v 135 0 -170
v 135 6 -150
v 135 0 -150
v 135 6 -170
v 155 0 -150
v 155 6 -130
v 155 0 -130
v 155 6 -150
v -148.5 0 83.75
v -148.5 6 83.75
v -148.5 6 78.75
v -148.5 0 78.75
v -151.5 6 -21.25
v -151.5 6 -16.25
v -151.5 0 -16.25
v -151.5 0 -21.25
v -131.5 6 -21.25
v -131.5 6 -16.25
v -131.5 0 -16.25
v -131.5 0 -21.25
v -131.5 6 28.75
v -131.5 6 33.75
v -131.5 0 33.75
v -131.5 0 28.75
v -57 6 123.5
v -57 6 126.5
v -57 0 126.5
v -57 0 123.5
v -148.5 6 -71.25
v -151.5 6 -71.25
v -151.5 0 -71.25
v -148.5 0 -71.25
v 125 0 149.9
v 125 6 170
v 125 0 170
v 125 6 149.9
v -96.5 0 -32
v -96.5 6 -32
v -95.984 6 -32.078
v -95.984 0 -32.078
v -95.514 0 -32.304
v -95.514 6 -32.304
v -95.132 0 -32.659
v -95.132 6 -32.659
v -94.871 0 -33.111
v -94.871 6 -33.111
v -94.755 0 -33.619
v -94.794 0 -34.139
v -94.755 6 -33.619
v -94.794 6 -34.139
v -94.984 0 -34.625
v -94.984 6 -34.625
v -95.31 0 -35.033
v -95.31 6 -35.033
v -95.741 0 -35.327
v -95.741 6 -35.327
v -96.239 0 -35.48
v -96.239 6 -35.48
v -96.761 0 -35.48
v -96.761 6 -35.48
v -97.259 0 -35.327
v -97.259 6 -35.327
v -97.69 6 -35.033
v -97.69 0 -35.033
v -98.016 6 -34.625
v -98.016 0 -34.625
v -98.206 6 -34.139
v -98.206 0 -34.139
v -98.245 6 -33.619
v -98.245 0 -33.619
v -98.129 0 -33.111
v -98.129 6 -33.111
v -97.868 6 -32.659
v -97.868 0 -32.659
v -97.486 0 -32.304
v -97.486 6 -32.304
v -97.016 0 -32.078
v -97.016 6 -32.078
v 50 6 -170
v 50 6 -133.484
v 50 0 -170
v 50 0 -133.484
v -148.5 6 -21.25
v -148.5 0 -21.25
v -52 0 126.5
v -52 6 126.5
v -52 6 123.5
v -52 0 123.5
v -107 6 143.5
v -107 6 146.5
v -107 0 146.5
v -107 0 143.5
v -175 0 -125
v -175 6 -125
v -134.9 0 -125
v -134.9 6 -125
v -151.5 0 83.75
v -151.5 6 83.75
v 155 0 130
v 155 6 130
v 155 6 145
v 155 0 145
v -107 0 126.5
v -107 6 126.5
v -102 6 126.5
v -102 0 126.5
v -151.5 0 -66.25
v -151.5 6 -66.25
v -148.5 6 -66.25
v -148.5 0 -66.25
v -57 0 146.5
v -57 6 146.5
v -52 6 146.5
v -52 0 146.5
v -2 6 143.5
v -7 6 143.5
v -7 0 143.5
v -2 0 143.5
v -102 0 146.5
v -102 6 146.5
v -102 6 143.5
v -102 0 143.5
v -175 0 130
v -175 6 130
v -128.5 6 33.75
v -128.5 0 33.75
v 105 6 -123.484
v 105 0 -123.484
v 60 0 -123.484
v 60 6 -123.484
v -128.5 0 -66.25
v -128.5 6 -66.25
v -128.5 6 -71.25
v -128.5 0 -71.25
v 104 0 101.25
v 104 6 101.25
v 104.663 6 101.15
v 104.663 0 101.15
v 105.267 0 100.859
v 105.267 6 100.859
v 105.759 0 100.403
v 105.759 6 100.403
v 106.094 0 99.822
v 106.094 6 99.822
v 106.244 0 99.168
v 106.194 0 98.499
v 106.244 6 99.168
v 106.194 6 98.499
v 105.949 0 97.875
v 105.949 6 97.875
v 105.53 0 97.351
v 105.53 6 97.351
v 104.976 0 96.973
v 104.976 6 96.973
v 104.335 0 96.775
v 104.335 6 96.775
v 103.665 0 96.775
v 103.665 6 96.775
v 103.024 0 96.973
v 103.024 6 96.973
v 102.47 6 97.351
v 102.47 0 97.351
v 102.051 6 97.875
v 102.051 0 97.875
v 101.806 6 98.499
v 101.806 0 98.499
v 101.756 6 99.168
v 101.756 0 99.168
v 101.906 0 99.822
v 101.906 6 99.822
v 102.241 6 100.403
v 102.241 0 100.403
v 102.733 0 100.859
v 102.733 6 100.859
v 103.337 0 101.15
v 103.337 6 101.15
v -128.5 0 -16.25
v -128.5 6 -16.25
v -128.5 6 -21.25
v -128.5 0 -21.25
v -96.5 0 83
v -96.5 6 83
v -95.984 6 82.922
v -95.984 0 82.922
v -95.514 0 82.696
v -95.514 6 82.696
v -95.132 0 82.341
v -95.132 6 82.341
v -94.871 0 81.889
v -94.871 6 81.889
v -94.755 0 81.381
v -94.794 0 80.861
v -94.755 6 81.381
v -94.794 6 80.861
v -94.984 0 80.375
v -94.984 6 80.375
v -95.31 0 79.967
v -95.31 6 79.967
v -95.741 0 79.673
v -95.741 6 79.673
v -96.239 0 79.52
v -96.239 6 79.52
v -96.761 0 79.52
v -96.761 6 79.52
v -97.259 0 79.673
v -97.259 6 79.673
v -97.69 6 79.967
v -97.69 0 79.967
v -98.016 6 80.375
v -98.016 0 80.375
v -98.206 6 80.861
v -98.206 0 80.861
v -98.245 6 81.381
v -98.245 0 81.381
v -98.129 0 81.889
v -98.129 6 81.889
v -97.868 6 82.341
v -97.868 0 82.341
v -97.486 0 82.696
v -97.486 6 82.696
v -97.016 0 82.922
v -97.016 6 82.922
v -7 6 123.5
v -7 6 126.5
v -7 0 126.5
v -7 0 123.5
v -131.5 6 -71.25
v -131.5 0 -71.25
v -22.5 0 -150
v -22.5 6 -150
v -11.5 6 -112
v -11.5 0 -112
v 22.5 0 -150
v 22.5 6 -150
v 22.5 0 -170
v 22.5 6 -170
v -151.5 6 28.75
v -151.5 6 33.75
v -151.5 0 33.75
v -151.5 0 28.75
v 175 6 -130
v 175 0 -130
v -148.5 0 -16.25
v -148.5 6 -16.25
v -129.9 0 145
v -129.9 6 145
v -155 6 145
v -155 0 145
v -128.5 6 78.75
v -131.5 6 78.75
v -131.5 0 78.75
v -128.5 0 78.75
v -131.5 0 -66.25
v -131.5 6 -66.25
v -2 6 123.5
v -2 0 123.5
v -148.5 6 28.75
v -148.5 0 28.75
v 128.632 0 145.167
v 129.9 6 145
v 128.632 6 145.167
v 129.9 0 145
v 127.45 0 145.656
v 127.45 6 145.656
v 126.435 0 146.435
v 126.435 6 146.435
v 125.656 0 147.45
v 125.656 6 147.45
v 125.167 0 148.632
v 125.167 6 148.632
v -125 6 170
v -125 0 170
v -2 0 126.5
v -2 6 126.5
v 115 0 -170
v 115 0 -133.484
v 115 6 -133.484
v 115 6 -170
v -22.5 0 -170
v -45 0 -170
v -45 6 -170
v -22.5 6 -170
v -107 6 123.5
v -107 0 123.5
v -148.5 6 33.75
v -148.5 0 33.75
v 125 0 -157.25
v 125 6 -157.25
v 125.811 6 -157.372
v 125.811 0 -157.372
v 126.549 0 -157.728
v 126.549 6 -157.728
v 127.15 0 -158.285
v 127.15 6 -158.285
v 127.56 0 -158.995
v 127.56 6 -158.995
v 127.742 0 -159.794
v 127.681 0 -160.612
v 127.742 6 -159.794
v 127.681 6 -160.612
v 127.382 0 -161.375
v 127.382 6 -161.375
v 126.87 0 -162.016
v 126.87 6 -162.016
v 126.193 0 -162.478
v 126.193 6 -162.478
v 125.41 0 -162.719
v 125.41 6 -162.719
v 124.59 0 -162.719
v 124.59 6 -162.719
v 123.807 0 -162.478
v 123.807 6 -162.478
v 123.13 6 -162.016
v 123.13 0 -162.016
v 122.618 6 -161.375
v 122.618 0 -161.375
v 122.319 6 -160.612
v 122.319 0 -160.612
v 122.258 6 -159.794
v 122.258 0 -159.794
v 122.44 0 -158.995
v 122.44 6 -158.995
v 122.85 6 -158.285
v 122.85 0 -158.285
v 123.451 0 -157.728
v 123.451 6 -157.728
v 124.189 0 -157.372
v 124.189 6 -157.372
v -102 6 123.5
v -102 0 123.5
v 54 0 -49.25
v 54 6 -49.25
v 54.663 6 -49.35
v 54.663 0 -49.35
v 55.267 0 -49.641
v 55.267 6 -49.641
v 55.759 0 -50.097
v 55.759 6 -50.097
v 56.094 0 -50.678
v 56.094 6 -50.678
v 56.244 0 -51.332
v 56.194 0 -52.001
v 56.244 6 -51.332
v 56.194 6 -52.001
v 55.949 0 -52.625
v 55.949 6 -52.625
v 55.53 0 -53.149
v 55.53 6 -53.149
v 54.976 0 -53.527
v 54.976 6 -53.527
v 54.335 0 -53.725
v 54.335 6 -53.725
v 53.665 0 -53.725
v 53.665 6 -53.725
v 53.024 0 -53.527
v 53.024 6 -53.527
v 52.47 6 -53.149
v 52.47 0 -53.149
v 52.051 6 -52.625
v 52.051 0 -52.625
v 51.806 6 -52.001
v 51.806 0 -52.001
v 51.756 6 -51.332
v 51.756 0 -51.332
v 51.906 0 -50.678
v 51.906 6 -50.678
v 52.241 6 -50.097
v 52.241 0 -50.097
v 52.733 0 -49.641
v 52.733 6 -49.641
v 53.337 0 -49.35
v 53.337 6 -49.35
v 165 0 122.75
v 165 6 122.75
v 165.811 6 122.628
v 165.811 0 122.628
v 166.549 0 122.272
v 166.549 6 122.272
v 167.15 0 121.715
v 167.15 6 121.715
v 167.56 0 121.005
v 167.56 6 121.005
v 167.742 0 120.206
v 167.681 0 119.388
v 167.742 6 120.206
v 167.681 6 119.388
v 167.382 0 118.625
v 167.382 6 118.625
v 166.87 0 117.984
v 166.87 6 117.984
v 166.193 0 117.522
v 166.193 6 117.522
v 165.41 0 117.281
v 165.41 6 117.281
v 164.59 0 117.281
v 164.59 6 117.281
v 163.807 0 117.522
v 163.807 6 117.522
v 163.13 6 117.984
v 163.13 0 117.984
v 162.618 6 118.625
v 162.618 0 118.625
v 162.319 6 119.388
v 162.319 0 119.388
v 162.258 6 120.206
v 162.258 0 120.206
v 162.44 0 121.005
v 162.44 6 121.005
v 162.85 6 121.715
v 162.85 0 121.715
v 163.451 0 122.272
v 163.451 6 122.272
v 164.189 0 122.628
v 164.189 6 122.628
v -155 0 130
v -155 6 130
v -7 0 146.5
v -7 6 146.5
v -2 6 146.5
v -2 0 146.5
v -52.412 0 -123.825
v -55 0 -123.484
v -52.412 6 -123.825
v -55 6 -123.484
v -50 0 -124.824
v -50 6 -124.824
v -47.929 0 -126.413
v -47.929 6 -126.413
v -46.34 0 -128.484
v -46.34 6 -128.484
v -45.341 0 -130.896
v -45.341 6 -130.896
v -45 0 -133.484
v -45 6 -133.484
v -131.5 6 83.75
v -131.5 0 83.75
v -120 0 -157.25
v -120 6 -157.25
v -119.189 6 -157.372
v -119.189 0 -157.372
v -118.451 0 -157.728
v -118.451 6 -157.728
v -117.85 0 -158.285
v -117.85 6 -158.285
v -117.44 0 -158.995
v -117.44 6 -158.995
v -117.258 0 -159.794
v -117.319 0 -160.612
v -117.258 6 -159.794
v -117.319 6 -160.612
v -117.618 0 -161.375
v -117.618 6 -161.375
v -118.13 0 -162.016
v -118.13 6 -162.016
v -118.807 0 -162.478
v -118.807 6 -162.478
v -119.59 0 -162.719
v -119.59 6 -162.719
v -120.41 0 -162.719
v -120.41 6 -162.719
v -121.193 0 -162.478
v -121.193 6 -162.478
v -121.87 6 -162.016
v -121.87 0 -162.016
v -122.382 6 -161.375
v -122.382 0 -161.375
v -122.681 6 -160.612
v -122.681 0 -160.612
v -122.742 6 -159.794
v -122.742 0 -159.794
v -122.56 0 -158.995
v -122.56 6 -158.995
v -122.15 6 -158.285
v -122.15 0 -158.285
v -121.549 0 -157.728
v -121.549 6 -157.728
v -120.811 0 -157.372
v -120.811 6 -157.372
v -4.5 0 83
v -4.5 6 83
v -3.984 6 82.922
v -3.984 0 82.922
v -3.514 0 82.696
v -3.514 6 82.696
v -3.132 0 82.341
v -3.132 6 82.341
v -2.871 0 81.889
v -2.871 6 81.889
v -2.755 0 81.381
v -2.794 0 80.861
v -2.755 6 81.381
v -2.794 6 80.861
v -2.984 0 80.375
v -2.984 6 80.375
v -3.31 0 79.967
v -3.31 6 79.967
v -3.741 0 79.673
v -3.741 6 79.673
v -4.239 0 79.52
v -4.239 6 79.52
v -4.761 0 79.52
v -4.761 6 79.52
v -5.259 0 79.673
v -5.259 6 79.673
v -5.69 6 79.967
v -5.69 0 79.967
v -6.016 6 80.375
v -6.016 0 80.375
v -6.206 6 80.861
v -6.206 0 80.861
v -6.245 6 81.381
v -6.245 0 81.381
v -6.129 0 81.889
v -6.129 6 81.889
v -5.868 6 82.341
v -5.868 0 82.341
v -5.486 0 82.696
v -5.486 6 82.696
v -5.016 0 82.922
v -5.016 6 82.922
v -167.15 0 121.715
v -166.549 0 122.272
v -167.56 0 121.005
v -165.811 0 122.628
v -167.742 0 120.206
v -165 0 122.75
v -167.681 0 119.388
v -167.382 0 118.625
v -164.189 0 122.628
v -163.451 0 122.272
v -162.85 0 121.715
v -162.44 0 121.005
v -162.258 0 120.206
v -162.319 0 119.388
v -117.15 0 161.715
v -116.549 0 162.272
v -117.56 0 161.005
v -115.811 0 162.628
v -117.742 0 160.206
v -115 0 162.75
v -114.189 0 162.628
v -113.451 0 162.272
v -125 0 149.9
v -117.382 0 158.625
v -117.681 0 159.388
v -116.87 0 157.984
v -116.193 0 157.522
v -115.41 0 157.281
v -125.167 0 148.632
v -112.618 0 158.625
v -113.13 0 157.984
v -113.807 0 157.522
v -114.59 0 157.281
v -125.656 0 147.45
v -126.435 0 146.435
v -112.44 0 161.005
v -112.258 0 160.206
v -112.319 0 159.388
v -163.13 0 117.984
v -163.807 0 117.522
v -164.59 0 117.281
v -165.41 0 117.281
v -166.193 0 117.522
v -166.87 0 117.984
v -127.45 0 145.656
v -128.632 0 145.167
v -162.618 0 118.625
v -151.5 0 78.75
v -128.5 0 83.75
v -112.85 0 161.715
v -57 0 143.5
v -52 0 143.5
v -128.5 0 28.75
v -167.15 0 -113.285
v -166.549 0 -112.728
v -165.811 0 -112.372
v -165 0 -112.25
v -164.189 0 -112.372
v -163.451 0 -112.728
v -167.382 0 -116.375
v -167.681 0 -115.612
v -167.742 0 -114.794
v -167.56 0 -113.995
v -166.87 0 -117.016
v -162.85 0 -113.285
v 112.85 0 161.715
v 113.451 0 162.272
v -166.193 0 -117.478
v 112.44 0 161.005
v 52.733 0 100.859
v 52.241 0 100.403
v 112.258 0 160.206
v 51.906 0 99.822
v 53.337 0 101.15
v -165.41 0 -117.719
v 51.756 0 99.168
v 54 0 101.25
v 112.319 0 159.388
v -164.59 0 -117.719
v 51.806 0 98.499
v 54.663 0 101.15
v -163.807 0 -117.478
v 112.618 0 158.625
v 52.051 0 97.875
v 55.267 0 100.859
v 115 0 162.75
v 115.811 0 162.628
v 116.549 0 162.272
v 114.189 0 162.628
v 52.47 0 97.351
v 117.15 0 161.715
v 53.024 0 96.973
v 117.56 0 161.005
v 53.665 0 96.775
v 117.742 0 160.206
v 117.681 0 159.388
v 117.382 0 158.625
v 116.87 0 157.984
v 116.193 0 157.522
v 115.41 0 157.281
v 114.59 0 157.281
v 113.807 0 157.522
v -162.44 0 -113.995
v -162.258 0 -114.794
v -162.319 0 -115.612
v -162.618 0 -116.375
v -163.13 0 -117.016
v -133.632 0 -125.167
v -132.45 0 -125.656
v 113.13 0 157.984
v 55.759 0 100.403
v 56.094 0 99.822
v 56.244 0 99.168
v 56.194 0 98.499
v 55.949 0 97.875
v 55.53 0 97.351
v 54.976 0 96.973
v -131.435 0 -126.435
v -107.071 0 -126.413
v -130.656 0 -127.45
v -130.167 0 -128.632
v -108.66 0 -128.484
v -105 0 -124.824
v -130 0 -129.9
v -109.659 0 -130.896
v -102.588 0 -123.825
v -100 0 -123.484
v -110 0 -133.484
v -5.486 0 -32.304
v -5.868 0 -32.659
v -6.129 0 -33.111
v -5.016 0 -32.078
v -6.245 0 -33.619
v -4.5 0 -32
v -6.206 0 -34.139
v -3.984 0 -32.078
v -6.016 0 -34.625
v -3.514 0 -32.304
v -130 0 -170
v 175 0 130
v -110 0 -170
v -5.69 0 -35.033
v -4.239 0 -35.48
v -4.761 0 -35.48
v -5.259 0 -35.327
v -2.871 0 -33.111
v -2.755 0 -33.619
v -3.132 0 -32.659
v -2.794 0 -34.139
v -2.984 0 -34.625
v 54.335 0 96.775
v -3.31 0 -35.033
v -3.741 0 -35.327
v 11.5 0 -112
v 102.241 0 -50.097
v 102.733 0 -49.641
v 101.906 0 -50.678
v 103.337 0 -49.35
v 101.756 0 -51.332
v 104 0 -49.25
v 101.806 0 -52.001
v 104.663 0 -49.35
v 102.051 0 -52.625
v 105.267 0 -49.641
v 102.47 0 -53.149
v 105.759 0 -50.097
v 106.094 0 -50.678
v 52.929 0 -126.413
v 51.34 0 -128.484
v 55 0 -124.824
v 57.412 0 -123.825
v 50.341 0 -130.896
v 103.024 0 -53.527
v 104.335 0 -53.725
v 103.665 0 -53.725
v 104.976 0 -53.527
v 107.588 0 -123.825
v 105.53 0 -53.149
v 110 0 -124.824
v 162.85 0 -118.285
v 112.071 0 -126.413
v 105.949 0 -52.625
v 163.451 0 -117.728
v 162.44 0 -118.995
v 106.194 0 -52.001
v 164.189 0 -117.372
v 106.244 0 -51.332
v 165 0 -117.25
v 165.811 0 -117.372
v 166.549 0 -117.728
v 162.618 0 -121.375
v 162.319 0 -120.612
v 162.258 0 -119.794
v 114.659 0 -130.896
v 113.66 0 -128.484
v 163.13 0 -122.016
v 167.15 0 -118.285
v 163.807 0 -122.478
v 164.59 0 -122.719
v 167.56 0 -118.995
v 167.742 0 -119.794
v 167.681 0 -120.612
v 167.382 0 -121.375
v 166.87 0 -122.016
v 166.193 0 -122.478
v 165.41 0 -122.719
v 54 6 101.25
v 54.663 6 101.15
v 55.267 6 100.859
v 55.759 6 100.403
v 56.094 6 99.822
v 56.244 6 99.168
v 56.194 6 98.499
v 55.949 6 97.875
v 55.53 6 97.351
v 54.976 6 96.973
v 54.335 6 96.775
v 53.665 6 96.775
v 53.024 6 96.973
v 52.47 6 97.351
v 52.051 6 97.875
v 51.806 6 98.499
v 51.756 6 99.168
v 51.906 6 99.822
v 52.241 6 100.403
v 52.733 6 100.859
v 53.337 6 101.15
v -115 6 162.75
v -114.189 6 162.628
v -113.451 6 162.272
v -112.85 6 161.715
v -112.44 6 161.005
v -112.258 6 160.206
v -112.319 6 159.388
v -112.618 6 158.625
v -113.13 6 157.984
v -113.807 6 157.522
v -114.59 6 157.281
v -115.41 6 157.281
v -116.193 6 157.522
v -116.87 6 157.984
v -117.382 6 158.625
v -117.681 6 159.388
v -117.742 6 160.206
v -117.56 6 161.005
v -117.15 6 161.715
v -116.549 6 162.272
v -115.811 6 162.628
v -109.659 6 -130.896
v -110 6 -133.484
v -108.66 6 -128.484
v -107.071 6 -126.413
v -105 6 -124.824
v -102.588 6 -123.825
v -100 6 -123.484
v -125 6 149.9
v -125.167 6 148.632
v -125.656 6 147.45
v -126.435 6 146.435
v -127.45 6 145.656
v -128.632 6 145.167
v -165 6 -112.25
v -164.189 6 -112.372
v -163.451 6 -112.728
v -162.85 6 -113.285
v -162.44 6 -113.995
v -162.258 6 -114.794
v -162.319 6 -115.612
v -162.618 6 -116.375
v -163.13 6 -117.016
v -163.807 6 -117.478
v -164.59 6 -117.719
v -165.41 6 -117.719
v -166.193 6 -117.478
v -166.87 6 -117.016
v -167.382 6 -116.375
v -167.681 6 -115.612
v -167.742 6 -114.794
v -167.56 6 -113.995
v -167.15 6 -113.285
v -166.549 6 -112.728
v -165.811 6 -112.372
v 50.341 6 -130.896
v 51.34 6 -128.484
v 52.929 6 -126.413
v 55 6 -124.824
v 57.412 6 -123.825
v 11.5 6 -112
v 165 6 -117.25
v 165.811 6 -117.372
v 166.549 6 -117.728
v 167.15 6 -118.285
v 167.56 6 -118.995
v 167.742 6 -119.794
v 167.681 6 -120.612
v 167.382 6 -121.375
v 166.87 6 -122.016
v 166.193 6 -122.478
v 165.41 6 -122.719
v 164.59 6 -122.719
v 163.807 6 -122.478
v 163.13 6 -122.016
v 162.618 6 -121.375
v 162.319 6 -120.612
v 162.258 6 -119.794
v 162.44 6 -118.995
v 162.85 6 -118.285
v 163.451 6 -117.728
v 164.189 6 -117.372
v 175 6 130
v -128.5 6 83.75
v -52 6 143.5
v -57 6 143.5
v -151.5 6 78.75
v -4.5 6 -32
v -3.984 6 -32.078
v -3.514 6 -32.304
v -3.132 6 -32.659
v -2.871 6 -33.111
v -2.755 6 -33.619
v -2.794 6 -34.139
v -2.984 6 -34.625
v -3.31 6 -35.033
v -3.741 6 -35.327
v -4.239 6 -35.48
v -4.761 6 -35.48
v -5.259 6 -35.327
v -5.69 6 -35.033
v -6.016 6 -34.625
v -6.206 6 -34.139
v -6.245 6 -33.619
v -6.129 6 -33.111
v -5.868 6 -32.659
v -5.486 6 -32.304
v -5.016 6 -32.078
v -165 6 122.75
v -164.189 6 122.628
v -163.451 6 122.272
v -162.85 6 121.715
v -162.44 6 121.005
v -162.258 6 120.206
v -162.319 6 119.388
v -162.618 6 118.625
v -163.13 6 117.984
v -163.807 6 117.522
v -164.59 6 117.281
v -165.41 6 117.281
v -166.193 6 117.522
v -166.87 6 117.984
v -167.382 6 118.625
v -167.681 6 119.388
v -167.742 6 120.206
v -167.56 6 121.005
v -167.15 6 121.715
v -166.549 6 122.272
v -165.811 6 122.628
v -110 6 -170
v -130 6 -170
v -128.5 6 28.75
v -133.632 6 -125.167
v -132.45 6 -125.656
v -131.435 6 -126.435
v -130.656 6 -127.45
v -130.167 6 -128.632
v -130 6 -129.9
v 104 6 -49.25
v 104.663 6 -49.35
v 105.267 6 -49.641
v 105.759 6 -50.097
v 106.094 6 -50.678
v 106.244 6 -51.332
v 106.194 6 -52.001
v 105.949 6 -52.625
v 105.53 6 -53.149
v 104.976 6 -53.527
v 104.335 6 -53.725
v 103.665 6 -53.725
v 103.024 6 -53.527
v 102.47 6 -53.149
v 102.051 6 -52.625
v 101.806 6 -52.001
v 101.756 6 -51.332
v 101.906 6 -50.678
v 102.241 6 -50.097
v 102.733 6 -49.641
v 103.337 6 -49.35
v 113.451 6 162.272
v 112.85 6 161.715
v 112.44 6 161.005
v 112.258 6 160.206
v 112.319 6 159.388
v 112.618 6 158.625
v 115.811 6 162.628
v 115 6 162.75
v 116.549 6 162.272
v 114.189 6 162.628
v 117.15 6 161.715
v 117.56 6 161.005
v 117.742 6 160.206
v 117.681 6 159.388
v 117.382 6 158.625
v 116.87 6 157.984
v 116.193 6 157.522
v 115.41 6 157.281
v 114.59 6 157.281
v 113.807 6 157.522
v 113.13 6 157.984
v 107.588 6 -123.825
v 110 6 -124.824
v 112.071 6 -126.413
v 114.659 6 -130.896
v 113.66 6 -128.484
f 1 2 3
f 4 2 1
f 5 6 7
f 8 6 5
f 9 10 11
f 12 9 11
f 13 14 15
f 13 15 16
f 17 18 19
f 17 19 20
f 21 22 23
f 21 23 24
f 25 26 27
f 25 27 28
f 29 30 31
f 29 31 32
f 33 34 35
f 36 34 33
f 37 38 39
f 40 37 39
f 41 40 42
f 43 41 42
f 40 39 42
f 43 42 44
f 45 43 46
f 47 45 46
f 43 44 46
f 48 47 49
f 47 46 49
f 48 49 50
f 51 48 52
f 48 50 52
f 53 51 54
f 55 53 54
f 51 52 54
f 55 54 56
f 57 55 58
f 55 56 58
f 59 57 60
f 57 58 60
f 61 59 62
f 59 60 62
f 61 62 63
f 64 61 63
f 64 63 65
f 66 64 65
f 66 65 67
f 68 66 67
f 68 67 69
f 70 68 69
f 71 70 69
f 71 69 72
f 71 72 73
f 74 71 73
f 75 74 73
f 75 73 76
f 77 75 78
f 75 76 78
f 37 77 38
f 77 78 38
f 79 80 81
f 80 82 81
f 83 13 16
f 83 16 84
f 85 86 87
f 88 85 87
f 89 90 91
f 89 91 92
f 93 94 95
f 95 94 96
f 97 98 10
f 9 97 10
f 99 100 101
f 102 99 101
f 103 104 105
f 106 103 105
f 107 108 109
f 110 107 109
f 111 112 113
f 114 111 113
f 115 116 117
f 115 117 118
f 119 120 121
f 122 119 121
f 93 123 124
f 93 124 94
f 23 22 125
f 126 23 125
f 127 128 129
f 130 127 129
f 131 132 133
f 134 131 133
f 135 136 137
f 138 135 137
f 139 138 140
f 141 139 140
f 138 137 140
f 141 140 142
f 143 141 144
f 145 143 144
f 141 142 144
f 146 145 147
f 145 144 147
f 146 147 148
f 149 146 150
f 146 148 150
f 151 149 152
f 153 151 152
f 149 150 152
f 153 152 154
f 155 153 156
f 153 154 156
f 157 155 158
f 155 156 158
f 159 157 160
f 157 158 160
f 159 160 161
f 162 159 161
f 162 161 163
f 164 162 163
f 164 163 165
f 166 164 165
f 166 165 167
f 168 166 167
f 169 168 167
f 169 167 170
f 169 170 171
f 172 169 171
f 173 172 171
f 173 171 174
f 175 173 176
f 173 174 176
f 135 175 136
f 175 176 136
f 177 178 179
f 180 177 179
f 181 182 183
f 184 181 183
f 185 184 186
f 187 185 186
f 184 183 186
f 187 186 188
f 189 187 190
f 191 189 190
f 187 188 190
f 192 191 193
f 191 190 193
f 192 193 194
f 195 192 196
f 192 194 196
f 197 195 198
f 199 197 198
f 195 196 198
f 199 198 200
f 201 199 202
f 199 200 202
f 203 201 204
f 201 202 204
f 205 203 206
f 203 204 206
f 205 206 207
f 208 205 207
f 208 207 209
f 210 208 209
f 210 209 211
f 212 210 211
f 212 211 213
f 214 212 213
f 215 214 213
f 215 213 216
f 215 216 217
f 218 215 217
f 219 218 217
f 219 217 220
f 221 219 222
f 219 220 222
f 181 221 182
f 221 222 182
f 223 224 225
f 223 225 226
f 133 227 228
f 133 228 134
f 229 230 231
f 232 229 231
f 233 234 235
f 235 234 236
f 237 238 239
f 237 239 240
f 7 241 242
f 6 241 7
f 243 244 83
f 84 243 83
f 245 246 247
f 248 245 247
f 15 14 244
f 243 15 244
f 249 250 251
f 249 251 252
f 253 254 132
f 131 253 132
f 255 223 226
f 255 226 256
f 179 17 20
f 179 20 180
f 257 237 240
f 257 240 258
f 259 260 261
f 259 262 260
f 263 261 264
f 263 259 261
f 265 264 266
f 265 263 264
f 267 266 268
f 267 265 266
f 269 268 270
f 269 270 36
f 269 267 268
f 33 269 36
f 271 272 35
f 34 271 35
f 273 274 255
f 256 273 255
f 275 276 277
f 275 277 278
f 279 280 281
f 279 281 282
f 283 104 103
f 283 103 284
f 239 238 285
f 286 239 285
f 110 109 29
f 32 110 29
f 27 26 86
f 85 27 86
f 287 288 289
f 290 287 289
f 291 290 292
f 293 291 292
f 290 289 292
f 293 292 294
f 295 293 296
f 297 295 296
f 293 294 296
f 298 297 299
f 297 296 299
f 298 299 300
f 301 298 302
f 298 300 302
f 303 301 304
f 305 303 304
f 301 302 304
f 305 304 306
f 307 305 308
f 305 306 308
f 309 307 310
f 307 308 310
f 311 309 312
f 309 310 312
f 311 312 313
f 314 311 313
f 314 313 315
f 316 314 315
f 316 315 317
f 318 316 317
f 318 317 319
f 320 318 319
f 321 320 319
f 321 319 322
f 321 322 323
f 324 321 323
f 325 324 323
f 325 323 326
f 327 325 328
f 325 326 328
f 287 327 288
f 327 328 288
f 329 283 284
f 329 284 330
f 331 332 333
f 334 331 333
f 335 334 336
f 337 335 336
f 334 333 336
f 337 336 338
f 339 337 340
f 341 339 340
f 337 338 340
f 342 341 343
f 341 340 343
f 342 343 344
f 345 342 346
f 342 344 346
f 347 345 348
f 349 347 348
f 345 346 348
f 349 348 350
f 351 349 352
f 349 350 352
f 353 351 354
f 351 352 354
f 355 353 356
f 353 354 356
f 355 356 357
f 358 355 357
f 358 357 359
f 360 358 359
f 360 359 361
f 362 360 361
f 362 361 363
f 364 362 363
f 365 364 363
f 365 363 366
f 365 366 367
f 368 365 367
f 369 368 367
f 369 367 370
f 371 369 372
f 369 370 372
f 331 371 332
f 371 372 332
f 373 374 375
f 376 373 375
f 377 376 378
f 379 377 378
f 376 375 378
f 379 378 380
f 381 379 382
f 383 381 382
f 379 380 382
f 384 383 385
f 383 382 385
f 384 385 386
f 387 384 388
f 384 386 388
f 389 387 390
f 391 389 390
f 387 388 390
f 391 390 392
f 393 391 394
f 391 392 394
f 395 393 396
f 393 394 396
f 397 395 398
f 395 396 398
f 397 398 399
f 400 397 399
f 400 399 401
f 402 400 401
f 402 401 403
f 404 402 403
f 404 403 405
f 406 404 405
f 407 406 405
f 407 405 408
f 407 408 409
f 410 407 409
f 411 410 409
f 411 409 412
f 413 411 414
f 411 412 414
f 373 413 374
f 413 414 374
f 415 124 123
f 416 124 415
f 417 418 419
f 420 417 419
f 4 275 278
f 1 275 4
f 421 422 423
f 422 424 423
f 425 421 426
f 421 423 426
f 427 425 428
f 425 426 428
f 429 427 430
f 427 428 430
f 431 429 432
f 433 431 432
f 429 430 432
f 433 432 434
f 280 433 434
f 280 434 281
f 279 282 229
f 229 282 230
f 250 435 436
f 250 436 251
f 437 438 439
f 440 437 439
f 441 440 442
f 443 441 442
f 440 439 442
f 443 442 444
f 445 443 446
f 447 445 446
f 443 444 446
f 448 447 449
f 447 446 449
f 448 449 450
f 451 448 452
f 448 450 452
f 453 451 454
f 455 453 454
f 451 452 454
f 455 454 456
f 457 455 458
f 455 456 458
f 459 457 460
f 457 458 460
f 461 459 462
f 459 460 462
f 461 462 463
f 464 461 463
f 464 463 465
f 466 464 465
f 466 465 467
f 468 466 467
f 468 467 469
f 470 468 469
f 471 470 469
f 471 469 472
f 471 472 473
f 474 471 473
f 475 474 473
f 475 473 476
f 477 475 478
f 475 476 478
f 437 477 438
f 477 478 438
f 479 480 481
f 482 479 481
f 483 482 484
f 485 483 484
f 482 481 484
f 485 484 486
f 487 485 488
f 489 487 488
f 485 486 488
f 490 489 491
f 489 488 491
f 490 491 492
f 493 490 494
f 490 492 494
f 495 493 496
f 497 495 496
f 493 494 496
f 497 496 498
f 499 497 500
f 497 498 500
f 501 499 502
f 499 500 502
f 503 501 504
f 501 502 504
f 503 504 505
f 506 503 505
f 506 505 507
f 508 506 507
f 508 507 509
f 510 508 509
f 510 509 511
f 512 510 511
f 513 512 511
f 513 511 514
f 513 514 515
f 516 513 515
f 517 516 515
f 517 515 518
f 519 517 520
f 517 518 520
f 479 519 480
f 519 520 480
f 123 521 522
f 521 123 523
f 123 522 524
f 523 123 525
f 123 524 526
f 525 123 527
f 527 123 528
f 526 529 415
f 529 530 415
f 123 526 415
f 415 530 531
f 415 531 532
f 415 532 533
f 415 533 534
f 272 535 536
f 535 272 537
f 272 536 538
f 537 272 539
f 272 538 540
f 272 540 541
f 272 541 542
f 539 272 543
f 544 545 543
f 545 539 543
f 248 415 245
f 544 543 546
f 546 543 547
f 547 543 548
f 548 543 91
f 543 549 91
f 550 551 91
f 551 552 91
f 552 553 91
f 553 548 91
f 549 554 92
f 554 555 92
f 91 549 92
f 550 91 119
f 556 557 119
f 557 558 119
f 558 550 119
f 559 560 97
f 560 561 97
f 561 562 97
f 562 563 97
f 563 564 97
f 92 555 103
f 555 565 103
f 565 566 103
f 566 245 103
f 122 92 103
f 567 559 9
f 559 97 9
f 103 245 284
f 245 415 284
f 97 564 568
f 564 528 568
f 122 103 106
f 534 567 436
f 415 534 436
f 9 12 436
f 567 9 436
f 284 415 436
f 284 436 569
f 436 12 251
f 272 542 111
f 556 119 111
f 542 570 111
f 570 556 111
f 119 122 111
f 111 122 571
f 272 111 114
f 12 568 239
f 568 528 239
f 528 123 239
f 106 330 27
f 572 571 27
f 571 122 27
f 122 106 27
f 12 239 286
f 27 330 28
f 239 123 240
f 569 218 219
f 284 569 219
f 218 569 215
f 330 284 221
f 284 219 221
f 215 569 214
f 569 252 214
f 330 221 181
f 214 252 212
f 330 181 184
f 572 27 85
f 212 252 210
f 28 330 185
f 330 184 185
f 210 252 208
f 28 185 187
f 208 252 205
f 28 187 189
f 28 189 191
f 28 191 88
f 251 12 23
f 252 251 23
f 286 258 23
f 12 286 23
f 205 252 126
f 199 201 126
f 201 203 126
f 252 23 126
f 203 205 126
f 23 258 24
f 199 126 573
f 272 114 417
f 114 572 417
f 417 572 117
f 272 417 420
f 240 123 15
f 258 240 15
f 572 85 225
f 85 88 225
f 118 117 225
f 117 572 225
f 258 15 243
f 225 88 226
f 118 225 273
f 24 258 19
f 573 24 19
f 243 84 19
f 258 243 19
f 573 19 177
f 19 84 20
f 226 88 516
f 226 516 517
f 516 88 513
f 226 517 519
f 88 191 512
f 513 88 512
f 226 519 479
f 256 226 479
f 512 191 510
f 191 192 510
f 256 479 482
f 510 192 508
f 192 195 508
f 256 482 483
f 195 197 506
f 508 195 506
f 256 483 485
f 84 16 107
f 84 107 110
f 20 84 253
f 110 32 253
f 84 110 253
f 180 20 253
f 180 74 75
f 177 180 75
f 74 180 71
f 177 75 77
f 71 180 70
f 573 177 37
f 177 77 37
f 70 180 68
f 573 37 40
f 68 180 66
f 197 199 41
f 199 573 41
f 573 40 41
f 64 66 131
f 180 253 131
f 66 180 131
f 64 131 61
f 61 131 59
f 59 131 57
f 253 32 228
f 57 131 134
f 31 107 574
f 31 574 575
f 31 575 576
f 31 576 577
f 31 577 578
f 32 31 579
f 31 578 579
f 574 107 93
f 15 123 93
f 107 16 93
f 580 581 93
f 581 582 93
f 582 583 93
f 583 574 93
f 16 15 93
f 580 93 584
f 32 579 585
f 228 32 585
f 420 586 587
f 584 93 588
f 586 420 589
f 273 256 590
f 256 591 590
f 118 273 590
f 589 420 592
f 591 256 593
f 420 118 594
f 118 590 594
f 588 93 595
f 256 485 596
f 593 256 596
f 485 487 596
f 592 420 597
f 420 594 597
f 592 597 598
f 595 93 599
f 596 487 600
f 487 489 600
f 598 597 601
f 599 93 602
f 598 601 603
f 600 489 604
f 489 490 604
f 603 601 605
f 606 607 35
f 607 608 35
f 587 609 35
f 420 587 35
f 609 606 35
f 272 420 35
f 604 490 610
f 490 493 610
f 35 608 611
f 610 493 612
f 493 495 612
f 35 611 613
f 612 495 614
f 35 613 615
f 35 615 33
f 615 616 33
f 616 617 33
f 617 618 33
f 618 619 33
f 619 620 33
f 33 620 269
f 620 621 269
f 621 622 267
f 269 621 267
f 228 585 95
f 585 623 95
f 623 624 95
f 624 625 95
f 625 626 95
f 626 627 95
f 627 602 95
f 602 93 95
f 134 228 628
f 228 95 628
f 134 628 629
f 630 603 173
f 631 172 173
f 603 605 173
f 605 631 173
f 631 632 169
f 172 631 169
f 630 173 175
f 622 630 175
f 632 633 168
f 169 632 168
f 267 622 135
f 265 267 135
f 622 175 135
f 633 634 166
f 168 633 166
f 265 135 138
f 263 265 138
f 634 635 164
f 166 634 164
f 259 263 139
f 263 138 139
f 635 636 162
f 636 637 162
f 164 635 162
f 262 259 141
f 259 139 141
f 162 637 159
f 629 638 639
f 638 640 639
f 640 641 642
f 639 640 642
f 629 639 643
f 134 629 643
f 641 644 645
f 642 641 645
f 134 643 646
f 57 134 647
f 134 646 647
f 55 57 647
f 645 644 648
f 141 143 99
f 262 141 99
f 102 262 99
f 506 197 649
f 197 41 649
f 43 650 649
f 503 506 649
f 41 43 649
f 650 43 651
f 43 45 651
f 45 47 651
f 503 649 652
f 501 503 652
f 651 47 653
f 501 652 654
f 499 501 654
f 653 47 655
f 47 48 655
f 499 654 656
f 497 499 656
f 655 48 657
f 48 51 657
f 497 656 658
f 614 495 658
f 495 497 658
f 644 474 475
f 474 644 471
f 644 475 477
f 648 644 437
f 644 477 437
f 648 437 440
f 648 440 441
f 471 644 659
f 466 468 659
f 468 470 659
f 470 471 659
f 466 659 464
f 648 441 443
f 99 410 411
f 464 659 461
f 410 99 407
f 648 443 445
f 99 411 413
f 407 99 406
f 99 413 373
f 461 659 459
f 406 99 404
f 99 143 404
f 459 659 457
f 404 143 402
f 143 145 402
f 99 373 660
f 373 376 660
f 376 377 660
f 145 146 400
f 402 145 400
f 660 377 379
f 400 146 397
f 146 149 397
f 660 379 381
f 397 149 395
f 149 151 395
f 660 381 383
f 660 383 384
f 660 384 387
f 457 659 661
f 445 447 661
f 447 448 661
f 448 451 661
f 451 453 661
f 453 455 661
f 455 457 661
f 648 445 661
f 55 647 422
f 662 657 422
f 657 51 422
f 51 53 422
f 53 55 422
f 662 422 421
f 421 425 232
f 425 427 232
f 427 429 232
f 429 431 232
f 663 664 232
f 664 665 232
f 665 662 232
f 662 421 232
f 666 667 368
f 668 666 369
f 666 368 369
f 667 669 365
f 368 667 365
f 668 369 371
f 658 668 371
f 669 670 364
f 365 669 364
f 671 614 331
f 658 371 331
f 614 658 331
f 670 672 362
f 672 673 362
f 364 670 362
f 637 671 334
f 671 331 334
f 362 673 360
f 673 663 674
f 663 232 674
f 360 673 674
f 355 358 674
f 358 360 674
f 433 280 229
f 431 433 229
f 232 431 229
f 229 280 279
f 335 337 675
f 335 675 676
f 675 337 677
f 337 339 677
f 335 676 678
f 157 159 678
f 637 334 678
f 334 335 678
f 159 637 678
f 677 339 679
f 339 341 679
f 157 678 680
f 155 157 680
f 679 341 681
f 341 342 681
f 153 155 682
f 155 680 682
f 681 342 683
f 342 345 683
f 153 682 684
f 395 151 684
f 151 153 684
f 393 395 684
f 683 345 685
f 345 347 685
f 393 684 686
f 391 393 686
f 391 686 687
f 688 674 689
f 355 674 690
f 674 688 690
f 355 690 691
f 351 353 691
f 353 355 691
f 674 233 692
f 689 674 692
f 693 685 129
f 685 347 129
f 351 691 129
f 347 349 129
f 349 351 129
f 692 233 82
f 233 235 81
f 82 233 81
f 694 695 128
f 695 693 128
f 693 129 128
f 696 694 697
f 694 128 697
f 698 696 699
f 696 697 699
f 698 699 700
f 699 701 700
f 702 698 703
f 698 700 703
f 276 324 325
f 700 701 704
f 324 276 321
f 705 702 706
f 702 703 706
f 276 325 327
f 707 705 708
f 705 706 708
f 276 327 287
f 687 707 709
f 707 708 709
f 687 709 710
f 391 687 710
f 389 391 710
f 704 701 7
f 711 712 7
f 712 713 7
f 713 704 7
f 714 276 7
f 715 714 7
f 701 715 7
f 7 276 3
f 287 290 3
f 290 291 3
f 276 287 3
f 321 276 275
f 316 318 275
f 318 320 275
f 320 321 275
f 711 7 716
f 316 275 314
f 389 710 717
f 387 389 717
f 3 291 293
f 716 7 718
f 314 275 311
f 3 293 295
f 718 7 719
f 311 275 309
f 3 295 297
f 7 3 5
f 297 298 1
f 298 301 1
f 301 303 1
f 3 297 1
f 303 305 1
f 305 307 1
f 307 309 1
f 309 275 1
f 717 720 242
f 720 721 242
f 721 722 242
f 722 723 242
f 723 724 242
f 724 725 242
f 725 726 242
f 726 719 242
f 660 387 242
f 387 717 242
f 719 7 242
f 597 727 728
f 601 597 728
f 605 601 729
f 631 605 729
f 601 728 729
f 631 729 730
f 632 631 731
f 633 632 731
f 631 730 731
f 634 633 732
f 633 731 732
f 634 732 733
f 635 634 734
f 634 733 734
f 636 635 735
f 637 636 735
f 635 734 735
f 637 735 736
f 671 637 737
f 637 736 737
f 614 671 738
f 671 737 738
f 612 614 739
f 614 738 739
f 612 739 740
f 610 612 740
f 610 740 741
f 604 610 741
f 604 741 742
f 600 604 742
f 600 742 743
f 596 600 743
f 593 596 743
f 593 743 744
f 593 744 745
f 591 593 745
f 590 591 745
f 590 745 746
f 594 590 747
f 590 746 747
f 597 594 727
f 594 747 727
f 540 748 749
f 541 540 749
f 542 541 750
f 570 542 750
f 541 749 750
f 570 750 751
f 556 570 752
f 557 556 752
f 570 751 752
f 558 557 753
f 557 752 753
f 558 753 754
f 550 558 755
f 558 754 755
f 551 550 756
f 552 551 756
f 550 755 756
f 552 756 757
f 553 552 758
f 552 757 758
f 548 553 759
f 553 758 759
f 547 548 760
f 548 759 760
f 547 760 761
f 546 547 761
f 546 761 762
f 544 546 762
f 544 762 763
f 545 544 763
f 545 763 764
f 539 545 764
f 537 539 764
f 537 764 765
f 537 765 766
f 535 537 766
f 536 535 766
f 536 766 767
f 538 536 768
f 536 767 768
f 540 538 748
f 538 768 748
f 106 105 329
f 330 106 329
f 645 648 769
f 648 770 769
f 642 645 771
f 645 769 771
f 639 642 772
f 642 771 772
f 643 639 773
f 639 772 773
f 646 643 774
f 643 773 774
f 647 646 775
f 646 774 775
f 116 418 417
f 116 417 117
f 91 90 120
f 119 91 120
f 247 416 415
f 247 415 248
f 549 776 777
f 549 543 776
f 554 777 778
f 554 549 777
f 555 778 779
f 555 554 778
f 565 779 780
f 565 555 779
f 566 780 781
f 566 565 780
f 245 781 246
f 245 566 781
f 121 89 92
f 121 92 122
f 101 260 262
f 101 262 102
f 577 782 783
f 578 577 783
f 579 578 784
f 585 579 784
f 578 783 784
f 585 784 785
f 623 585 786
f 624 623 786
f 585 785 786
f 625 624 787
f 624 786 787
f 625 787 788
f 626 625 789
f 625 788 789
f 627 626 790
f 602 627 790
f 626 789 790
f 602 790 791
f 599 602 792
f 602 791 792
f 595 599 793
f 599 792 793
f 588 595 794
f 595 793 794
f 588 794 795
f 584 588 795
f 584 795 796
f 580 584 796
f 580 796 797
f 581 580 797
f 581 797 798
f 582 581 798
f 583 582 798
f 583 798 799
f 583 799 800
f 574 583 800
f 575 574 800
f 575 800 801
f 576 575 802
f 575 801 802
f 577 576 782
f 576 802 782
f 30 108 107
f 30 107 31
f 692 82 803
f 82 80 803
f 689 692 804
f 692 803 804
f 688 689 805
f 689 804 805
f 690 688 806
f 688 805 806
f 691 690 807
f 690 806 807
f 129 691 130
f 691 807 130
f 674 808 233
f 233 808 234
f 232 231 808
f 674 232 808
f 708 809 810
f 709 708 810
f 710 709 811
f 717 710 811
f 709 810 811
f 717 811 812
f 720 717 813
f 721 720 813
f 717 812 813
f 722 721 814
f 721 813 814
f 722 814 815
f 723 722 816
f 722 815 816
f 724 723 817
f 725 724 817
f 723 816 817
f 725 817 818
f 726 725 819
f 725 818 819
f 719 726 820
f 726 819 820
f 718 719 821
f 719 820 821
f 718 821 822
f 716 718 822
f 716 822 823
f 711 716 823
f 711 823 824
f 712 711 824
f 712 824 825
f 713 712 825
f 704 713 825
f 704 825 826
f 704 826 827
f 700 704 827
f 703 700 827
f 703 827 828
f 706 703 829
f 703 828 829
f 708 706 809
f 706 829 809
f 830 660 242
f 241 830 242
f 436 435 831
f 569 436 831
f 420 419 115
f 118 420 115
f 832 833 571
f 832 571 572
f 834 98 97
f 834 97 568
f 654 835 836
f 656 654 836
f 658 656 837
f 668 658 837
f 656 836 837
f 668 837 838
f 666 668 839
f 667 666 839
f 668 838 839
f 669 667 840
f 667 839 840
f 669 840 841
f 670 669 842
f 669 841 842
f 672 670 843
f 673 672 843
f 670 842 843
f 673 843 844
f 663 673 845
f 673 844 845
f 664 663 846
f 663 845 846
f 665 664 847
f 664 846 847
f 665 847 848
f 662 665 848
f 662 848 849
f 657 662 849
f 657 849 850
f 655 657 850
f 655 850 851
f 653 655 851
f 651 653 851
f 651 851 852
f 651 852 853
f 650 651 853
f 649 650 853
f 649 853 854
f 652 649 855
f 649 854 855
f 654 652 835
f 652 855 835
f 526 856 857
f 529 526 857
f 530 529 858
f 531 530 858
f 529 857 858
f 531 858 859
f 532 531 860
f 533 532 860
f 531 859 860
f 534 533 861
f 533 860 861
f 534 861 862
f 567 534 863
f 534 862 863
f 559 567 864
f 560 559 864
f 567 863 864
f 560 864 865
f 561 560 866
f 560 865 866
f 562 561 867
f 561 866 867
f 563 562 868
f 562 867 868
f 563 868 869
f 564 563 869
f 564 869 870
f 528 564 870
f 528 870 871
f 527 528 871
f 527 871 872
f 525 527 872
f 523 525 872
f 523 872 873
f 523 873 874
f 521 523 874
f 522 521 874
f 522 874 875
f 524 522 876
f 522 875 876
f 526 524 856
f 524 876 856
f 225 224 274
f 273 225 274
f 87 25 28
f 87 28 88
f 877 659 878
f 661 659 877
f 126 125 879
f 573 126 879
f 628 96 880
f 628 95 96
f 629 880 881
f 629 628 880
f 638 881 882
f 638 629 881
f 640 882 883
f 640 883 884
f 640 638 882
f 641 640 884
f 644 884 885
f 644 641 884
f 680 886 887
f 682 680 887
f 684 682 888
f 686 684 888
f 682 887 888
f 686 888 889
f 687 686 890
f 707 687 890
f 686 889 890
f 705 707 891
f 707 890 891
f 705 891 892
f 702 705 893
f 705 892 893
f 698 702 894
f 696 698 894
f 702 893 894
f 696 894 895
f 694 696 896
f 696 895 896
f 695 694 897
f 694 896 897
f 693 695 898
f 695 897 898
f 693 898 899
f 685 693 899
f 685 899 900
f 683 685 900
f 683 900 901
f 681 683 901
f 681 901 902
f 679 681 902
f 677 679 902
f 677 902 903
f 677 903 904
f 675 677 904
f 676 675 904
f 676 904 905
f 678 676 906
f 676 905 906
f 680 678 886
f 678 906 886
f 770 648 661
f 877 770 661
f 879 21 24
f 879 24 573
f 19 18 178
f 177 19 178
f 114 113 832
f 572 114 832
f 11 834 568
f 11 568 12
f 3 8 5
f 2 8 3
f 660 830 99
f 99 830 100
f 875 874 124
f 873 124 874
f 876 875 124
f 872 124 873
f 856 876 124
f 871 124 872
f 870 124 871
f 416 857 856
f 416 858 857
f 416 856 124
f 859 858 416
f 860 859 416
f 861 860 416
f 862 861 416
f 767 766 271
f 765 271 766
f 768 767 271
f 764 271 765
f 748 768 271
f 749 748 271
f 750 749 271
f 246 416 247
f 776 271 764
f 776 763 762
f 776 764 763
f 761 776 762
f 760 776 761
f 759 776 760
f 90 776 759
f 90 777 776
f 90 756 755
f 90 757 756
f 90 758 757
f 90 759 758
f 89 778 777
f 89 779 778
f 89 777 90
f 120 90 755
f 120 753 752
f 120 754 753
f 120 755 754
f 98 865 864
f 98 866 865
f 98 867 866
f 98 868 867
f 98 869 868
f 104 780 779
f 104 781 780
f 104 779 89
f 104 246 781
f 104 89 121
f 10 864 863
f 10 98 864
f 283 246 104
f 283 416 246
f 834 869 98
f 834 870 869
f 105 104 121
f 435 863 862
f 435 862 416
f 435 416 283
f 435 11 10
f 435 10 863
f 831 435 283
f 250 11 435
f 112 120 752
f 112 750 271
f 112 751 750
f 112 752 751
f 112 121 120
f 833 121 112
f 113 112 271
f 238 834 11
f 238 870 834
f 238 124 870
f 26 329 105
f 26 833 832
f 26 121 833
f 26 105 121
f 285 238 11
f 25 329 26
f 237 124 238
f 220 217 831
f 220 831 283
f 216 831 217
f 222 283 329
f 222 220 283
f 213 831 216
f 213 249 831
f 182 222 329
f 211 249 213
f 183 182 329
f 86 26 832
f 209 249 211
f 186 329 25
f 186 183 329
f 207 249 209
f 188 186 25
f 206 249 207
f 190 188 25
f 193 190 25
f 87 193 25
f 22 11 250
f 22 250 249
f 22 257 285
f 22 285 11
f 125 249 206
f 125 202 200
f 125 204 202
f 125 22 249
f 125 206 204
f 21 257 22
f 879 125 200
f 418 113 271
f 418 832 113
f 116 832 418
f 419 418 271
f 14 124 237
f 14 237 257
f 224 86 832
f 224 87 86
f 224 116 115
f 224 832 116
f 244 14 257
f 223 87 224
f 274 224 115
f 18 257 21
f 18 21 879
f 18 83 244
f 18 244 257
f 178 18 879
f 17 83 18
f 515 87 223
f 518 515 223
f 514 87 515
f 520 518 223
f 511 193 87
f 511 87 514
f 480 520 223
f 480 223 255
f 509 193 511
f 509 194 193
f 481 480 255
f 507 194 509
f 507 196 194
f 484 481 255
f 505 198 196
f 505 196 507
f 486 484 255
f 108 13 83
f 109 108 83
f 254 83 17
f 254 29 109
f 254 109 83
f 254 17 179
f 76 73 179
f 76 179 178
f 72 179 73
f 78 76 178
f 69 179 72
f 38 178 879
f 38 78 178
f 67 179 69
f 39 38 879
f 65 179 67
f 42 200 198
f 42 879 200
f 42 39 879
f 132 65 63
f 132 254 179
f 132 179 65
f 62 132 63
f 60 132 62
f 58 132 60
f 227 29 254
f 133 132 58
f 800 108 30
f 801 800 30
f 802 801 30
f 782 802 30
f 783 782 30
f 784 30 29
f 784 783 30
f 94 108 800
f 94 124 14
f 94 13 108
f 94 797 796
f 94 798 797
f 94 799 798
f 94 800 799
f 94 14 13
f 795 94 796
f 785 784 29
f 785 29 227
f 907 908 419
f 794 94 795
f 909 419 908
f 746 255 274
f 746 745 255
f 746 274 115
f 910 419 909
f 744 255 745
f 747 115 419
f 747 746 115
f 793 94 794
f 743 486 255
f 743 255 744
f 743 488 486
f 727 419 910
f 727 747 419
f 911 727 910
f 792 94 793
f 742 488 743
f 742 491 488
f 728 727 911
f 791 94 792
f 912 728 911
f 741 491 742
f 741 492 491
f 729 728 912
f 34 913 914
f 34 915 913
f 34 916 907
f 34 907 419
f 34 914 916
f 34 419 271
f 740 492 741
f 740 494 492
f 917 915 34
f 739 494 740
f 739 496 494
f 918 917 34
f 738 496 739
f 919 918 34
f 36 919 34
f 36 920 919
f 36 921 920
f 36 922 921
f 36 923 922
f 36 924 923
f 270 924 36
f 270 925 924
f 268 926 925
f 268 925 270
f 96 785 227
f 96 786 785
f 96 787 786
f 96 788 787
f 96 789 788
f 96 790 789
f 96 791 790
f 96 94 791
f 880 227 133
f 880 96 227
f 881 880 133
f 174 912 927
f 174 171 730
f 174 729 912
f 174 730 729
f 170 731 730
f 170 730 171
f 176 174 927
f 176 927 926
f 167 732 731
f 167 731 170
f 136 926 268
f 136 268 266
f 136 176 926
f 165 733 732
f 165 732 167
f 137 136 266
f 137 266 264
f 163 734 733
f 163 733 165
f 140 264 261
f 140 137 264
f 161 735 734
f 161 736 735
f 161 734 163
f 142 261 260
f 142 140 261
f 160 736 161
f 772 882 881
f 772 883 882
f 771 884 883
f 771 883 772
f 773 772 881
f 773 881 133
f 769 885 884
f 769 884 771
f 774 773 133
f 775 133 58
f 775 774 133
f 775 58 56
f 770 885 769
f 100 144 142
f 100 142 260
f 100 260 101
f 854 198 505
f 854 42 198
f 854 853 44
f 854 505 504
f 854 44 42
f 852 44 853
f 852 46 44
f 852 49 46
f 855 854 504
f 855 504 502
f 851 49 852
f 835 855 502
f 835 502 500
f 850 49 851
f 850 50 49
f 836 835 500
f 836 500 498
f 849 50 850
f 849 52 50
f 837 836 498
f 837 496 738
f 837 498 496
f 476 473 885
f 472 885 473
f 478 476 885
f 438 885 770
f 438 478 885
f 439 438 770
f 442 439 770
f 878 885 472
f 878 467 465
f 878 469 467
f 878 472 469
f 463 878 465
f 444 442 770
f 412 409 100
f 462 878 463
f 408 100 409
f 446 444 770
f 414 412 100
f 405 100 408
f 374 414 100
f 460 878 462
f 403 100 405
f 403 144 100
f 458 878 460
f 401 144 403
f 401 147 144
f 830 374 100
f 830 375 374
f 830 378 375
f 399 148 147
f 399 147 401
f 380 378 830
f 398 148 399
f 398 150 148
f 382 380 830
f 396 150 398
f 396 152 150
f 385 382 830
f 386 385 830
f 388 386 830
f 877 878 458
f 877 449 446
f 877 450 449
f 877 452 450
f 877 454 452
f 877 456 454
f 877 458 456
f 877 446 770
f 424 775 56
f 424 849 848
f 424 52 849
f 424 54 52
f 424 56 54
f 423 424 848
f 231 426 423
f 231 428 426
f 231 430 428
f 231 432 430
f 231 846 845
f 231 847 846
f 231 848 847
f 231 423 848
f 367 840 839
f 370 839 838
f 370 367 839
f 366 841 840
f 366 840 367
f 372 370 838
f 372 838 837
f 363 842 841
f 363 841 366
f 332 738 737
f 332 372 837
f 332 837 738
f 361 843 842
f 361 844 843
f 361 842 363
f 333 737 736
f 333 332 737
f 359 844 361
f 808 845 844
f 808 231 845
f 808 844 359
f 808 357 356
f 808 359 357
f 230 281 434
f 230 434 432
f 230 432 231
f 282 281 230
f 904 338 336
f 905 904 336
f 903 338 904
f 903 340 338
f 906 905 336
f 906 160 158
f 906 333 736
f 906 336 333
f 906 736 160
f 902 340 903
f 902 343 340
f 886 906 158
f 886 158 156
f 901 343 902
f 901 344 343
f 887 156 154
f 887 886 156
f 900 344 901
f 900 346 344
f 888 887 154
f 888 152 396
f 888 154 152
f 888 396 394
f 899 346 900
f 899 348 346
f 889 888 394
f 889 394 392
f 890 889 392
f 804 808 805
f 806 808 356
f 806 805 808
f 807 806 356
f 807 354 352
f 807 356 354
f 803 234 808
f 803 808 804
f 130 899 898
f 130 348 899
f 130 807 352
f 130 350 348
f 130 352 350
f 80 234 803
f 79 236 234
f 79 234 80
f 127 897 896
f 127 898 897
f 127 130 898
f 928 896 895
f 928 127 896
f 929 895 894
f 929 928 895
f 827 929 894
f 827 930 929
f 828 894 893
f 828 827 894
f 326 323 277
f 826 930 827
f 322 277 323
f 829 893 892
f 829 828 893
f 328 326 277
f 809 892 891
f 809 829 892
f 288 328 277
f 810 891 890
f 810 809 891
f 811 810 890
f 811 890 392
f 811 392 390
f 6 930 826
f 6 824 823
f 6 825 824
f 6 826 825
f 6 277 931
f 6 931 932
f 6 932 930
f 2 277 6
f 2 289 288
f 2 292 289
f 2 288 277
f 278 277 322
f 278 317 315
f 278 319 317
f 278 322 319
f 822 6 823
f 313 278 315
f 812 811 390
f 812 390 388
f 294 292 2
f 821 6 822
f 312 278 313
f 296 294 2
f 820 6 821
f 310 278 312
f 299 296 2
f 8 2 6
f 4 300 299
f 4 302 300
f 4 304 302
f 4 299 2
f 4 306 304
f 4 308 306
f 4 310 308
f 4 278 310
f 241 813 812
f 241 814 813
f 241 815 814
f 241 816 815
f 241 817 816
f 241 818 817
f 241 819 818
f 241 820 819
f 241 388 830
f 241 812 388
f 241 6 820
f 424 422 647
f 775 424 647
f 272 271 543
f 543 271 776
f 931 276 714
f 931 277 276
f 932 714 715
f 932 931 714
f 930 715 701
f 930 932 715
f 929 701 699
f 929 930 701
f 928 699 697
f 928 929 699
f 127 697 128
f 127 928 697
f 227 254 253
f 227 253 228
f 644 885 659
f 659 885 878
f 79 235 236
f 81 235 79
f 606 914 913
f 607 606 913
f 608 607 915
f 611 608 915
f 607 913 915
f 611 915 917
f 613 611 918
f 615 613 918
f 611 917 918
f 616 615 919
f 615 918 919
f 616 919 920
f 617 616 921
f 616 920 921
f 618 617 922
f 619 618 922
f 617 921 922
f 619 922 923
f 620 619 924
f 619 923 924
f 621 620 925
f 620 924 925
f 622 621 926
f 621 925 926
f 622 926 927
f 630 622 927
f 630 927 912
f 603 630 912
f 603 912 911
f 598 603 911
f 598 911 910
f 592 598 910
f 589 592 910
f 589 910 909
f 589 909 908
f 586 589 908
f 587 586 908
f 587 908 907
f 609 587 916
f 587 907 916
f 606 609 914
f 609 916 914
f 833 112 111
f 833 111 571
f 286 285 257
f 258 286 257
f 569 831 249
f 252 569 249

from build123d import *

# Parameters (mm, degrees)
SKETCH1_W            = 350
SKETCH1_H            = 340
BOSS_EXTRUDE1_DEPTH  = 6
CUT_EXTRUDE2_DEPTH   = 6
MIRROR2_COPY_1_DEPTH = 6
CUT_EXTRUDE3_DEPTH   = 6
SKETCH4_W            = 10
SKETCH4_H            = 82.256980738
CUT_EXTRUDE4_DEPTH   = 6
SKETCH5_R            = 2.25
SKETCH5_R_2          = 1.75
CUT_EXTRUDE5_DEPTH   = 6
SKETCH6_W            = 12
SKETCH6_H            = 9
CUT_EXTRUDE6_DEPTH   = 6
SKETCH8_W            = 5
SKETCH8_H            = 3
CUT_EXTRUDE7_DEPTH   = 6
LPATTERN1_COUNT      = 3
LPATTERN1_PITCH      = 50
SKETCH9_W            = 3
SKETCH9_H            = 5
CUT_EXTRUDE8_DEPTH   = 6
LPATTERN2_COUNT      = 4
LPATTERN2_PITCH      = 50
SKETCH10_W           = 30
SKETCH10_H           = 25
CUT_EXTRUDE9_DEPTH   = 6
SKETCH11_W           = 10
SKETCH11_H           = 51.49656536
CUT_EXTRUDE10_DEPTH  = 6
SKETCH12_W           = 45
SKETCH12_H           = 45
CUT_EXTRUDE11_DEPTH  = 6
FILLET2_R            = 4.9
SKETCH13_R           = 2.75
CUT_EXTRUDE12_DEPTH  = 6
SKETCH14_W           = 50
SKETCH14_H           = 20
SKETCH14_W_2         = 40
CUT_EXTRUDE13_DEPTH  = 10
FILLET4_R            = 5
FILLET5_R            = 5
SKETCH15_W           = 65
SKETCH15_H           = 46.515736948
CUT_EXTRUDE14_DEPTH  = 10
FILLET6_R            = 10


with BuildPart() as part:
    # Sketch1 → Boss-Extrude1 (new body)
    with BuildSketch(Plane(origin=(0, 0, 0), x_dir=(1, 0, 0), z_dir=(0, 1, 0))):
        Rectangle(SKETCH1_W, SKETCH1_H)
    extrude(amount=BOSS_EXTRUDE1_DEPTH)

    # Sketch2 → Cut-Extrude2 (cut)
    with BuildSketch(Plane(origin=(0, 6, 0), x_dir=(1, 0, 0), z_dir=(0, 1, 0))):
        Polygon((-175, -130), (-155, -130), (-155, -150), (-135, -150), (-135, -170), (-175, -170), align=None)
    cut_extrude2 = extrude(amount=-CUT_EXTRUDE2_DEPTH, mode=Mode.SUBTRACT)

    # Mirror1: Cut-Extrude2 across plane
    add(cut_extrude2.mirror(Plane.XY), mode=Mode.SUBTRACT)

    # Mirror2: Cut-Extrude2 across plane
    add(cut_extrude2.mirror(Plane(origin=(0, 0, 0), x_dir=(0, 0, 1), z_dir=(1, 0, 0))), mode=Mode.SUBTRACT)

    # Mirror2 copy 1 sketch → Mirror2 copy 1 (cut)
    with BuildSketch(Plane(origin=(0, 6, 0), x_dir=(-1, 0, 0), z_dir=(0, 1, 0))):
        Polygon((-175, -130), (-155, -130), (-155, -150), (-135, -150), (-135, -170), (-175, -170), align=None)
    extrude(amount=-MIRROR2_COPY_1_DEPTH, mode=Mode.SUBTRACT)

    # Sketch3 → Cut-Extrude3 (cut)
    with BuildSketch(Plane(origin=(0, 6, 0), x_dir=(1, 0, 0), z_dir=(0, 1, 0))):
        Polygon((-22.5, 170), (-22.5, 150), (-11.5, 112), (11.5, 112), (22.5, 150), (22.5, 170), align=None)
    extrude(amount=-CUT_EXTRUDE3_DEPTH, mode=Mode.SUBTRACT)

    # Sketch4 → Cut-Extrude4 (cut)
    with BuildSketch(Plane(origin=(0, 6, 0), x_dir=(1, 0, 0), z_dir=(0, 1, 0))):
        with Locations((-97.5, 165.128490369)):
            Rectangle(SKETCH4_W, SKETCH4_H)
        with Locations((97.5, 165.128490369)):
            Rectangle(SKETCH4_W, SKETCH4_H)
    extrude(amount=-CUT_EXTRUDE4_DEPTH, mode=Mode.SUBTRACT)

    # Sketch5 → Cut-Extrude5 (cut)
    with BuildSketch(Plane(origin=(0, 6, 0), x_dir=(1, 0, 0), z_dir=(0, 1, 0))):
        with Locations(Location((104, 51.5, 0), (0, 0, 270))):
            Circle(SKETCH5_R)
        with Locations(Location((104, -99, 0), (0, 0, 270))):
            Circle(SKETCH5_R)
        with Locations(Location((54, -99, 0), (0, 0, 270))):
            Circle(SKETCH5_R)
        with Locations(Location((54, 51.5, 0), (0, 0, 270))):
            Circle(SKETCH5_R)
        with Locations(Location((-4.5, 33.75, 0), (0, 0, 270))):
            Circle(SKETCH5_R_2)
        with Locations(Location((-4.5, -81.25, 0), (0, 0, 270))):
            Circle(SKETCH5_R_2)
        with Locations(Location((-96.5, -81.25, 0), (0, 0, 270))):
            Circle(SKETCH5_R_2)
        with Locations(Location((-96.5, 33.75, 0), (0, 0, 270))):
            Circle(SKETCH5_R_2)
    extrude(amount=-CUT_EXTRUDE5_DEPTH, mode=Mode.SUBTRACT)

    # Sketch6 → Cut-Extrude6 (cut)
    with BuildSketch(Plane(origin=(0, 6, 0), x_dir=(1, 0, 0), z_dir=(0, 1, 0))):
        with Locations((-97.5, 145.5)):
            Rectangle(SKETCH6_W, SKETCH6_H)
        with Locations((97.5, 145.5)):
            Rectangle(SKETCH6_W, SKETCH6_H)
    extrude(amount=-CUT_EXTRUDE6_DEPTH, mode=Mode.SUBTRACT)

    # Sketch8 → Cut-Extrude7 (cut)
    with BuildSketch(Plane(origin=(0, 6, 0), x_dir=(1, 0, 0), z_dir=(0, 1, 0))):
        with Locations((-4.5, -125)):
            Rectangle(SKETCH8_W, SKETCH8_H)
        with Locations((-4.5, -145)):
            Rectangle(SKETCH8_W, SKETCH8_H)
    cut_extrude7 = extrude(amount=-CUT_EXTRUDE7_DEPTH, mode=Mode.SUBTRACT)

    # LPattern1: Cut-Extrude7 ×3
    with Locations(*[(-i * LPATTERN1_PITCH, 0, 0) for i in range(1, LPATTERN1_COUNT)]):
        add(cut_extrude7, mode=Mode.SUBTRACT)

    # Sketch9 → Cut-Extrude8 (cut)
    with BuildSketch(Plane(origin=(0, 6, 0), x_dir=(1, 0, 0), z_dir=(0, 1, 0))):
        with Locations((-150, -81.25)):
            Rectangle(SKETCH9_W, SKETCH9_H)
        with Locations((-130, -81.25)):
            Rectangle(SKETCH9_W, SKETCH9_H)
    cut_extrude8 = extrude(amount=-CUT_EXTRUDE8_DEPTH, mode=Mode.SUBTRACT)

    # LPattern2: Cut-Extrude8 ×4
    with Locations(*[(0, 0, -i * LPATTERN2_PITCH) for i in range(1, LPATTERN2_COUNT)]):
        add(cut_extrude8, mode=Mode.SUBTRACT)

    # Sketch10 → Cut-Extrude9 (cut)
    with BuildSketch(Plane(origin=(0, 6, 0), x_dir=(1, 0, 0), z_dir=(0, 1, 0))):
        with Locations((140, -157.5)):
            Rectangle(SKETCH10_W, SKETCH10_H)
    cut_extrude9 = extrude(amount=-CUT_EXTRUDE9_DEPTH, mode=Mode.SUBTRACT)

    # Mirror3: Cut-Extrude9 across plane
    add(cut_extrude9.mirror(Plane(origin=(0, 0, 0), x_dir=(0, 0, 1), z_dir=(1, 0, 0))), mode=Mode.SUBTRACT)

    # Sketch11 → Cut-Extrude10 (cut)
    with BuildSketch(Plane(origin=(0, 6, 0), x_dir=(1, 0, 0), z_dir=(0, 1, 0))):
        with Locations((55, 165.74828268)):
            Rectangle(SKETCH11_W, SKETCH11_H)
    extrude(amount=-CUT_EXTRUDE10_DEPTH, mode=Mode.SUBTRACT)

    # Sketch12 → Cut-Extrude11 (cut)
    with BuildSketch(Plane(origin=(0, 6, 0), x_dir=(1, 0, 0), z_dir=(0, 1, 0))):
        with Locations((-152.5, 147.5)):
            Rectangle(SKETCH12_W, SKETCH12_H)
    extrude(amount=-CUT_EXTRUDE11_DEPTH, mode=Mode.SUBTRACT)

    # Fillet2
    fillet2_edges = [part.edges().sort_by_distance(p)[0] for p in [
        (125, 3, 145),
        (-125, 3, 145),
        (50, 3, -140),
        (60, 3, -140),
        (-130, 3, -125),
    ]]
    fillet(fillet2_edges, radius=FILLET2_R)

    # Sketch13 → Cut-Extrude12 (cut)
    with BuildSketch(Plane(origin=(0, 6, 0), x_dir=(1, 0, 0), z_dir=(0, 1, 0))):
        with Locations(Location((165, -120, 0), (0, 0, 270))):
            Circle(SKETCH13_R)
        with Locations(Location((165, 120, 0), (0, 0, 270))):
            Circle(SKETCH13_R)
        with Locations(Location((125, 160, 0), (0, 0, 270))):
            Circle(SKETCH13_R)
        with Locations(Location((-120, 160, 0), (0, 0, 270))):
            Circle(SKETCH13_R)
        with Locations(Location((-165, 115, 0), (0, 0, 270))):
            Circle(SKETCH13_R)
        with Locations(Location((-165, -120, 0), (0, 0, 270))):
            Circle(SKETCH13_R)
        with Locations(Location((-115, -160, 0), (0, 0, 270))):
            Circle(SKETCH13_R)
        with Locations(Location((115, -160, 0), (0, 0, 270))):
            Circle(SKETCH13_R)
    extrude(amount=-CUT_EXTRUDE12_DEPTH, mode=Mode.SUBTRACT)

    # Sketch14 → Cut-Extrude13 (cut)
    with BuildSketch(Plane(origin=(0, 6, 0), x_dir=(1, 0, 0), z_dir=(0, 1, 0))):
        with Locations((82.5, 160)):
            Rectangle(SKETCH14_W, SKETCH14_H)
        with Locations((-87.5, 160)):
            Rectangle(SKETCH14_W_2, SKETCH14_H)
    extrude(amount=-CUT_EXTRUDE13_DEPTH, mode=Mode.SUBTRACT)

    # Fillet4
    fillet4_edges = [part.edges().sort_by_distance(p)[0] for p in [
        (-102.5, 3, -124),
        (-92.5, 3, -124),
    ]]
    fillet(fillet4_edges, radius=FILLET4_R - 0.0001)  # a hair under: the kernel refuses the full size

    # Fillet5
    fillet5_edges = [part.edges().sort_by_distance(p)[0] for p in [
        (92.5, 3, -124),
        (102.5, 3, -124),
    ]]
    fillet(fillet5_edges, radius=FILLET5_R - 0.0001)  # a hair under: the kernel refuses the full size

    # Sketch15 → Cut-Extrude14 (cut)
    with BuildSketch(Plane(origin=(0, 0, 0), x_dir=(-1, 0, 0), z_dir=(0, -1, 0))):
        with Locations((77.5, 146.742131526)):
            Rectangle(SKETCH15_W, SKETCH15_H)
        with Locations((-82.5, 146.742131526)):
            Rectangle(SKETCH15_W, SKETCH15_H)
    extrude(amount=-CUT_EXTRUDE14_DEPTH, mode=Mode.SUBTRACT)

    # Fillet6
    fillet6_edges = [part.edges().sort_by_distance(p)[0] for p in [
        (-110, 3, -123.484263052),
        (-45, 3, -123.484263052),
        (50, 3, -123.484263052),
        (115, 3, -123.484263052),
    ]]
    fillet(fillet6_edges, radius=FILLET6_R)


solid = part.part
